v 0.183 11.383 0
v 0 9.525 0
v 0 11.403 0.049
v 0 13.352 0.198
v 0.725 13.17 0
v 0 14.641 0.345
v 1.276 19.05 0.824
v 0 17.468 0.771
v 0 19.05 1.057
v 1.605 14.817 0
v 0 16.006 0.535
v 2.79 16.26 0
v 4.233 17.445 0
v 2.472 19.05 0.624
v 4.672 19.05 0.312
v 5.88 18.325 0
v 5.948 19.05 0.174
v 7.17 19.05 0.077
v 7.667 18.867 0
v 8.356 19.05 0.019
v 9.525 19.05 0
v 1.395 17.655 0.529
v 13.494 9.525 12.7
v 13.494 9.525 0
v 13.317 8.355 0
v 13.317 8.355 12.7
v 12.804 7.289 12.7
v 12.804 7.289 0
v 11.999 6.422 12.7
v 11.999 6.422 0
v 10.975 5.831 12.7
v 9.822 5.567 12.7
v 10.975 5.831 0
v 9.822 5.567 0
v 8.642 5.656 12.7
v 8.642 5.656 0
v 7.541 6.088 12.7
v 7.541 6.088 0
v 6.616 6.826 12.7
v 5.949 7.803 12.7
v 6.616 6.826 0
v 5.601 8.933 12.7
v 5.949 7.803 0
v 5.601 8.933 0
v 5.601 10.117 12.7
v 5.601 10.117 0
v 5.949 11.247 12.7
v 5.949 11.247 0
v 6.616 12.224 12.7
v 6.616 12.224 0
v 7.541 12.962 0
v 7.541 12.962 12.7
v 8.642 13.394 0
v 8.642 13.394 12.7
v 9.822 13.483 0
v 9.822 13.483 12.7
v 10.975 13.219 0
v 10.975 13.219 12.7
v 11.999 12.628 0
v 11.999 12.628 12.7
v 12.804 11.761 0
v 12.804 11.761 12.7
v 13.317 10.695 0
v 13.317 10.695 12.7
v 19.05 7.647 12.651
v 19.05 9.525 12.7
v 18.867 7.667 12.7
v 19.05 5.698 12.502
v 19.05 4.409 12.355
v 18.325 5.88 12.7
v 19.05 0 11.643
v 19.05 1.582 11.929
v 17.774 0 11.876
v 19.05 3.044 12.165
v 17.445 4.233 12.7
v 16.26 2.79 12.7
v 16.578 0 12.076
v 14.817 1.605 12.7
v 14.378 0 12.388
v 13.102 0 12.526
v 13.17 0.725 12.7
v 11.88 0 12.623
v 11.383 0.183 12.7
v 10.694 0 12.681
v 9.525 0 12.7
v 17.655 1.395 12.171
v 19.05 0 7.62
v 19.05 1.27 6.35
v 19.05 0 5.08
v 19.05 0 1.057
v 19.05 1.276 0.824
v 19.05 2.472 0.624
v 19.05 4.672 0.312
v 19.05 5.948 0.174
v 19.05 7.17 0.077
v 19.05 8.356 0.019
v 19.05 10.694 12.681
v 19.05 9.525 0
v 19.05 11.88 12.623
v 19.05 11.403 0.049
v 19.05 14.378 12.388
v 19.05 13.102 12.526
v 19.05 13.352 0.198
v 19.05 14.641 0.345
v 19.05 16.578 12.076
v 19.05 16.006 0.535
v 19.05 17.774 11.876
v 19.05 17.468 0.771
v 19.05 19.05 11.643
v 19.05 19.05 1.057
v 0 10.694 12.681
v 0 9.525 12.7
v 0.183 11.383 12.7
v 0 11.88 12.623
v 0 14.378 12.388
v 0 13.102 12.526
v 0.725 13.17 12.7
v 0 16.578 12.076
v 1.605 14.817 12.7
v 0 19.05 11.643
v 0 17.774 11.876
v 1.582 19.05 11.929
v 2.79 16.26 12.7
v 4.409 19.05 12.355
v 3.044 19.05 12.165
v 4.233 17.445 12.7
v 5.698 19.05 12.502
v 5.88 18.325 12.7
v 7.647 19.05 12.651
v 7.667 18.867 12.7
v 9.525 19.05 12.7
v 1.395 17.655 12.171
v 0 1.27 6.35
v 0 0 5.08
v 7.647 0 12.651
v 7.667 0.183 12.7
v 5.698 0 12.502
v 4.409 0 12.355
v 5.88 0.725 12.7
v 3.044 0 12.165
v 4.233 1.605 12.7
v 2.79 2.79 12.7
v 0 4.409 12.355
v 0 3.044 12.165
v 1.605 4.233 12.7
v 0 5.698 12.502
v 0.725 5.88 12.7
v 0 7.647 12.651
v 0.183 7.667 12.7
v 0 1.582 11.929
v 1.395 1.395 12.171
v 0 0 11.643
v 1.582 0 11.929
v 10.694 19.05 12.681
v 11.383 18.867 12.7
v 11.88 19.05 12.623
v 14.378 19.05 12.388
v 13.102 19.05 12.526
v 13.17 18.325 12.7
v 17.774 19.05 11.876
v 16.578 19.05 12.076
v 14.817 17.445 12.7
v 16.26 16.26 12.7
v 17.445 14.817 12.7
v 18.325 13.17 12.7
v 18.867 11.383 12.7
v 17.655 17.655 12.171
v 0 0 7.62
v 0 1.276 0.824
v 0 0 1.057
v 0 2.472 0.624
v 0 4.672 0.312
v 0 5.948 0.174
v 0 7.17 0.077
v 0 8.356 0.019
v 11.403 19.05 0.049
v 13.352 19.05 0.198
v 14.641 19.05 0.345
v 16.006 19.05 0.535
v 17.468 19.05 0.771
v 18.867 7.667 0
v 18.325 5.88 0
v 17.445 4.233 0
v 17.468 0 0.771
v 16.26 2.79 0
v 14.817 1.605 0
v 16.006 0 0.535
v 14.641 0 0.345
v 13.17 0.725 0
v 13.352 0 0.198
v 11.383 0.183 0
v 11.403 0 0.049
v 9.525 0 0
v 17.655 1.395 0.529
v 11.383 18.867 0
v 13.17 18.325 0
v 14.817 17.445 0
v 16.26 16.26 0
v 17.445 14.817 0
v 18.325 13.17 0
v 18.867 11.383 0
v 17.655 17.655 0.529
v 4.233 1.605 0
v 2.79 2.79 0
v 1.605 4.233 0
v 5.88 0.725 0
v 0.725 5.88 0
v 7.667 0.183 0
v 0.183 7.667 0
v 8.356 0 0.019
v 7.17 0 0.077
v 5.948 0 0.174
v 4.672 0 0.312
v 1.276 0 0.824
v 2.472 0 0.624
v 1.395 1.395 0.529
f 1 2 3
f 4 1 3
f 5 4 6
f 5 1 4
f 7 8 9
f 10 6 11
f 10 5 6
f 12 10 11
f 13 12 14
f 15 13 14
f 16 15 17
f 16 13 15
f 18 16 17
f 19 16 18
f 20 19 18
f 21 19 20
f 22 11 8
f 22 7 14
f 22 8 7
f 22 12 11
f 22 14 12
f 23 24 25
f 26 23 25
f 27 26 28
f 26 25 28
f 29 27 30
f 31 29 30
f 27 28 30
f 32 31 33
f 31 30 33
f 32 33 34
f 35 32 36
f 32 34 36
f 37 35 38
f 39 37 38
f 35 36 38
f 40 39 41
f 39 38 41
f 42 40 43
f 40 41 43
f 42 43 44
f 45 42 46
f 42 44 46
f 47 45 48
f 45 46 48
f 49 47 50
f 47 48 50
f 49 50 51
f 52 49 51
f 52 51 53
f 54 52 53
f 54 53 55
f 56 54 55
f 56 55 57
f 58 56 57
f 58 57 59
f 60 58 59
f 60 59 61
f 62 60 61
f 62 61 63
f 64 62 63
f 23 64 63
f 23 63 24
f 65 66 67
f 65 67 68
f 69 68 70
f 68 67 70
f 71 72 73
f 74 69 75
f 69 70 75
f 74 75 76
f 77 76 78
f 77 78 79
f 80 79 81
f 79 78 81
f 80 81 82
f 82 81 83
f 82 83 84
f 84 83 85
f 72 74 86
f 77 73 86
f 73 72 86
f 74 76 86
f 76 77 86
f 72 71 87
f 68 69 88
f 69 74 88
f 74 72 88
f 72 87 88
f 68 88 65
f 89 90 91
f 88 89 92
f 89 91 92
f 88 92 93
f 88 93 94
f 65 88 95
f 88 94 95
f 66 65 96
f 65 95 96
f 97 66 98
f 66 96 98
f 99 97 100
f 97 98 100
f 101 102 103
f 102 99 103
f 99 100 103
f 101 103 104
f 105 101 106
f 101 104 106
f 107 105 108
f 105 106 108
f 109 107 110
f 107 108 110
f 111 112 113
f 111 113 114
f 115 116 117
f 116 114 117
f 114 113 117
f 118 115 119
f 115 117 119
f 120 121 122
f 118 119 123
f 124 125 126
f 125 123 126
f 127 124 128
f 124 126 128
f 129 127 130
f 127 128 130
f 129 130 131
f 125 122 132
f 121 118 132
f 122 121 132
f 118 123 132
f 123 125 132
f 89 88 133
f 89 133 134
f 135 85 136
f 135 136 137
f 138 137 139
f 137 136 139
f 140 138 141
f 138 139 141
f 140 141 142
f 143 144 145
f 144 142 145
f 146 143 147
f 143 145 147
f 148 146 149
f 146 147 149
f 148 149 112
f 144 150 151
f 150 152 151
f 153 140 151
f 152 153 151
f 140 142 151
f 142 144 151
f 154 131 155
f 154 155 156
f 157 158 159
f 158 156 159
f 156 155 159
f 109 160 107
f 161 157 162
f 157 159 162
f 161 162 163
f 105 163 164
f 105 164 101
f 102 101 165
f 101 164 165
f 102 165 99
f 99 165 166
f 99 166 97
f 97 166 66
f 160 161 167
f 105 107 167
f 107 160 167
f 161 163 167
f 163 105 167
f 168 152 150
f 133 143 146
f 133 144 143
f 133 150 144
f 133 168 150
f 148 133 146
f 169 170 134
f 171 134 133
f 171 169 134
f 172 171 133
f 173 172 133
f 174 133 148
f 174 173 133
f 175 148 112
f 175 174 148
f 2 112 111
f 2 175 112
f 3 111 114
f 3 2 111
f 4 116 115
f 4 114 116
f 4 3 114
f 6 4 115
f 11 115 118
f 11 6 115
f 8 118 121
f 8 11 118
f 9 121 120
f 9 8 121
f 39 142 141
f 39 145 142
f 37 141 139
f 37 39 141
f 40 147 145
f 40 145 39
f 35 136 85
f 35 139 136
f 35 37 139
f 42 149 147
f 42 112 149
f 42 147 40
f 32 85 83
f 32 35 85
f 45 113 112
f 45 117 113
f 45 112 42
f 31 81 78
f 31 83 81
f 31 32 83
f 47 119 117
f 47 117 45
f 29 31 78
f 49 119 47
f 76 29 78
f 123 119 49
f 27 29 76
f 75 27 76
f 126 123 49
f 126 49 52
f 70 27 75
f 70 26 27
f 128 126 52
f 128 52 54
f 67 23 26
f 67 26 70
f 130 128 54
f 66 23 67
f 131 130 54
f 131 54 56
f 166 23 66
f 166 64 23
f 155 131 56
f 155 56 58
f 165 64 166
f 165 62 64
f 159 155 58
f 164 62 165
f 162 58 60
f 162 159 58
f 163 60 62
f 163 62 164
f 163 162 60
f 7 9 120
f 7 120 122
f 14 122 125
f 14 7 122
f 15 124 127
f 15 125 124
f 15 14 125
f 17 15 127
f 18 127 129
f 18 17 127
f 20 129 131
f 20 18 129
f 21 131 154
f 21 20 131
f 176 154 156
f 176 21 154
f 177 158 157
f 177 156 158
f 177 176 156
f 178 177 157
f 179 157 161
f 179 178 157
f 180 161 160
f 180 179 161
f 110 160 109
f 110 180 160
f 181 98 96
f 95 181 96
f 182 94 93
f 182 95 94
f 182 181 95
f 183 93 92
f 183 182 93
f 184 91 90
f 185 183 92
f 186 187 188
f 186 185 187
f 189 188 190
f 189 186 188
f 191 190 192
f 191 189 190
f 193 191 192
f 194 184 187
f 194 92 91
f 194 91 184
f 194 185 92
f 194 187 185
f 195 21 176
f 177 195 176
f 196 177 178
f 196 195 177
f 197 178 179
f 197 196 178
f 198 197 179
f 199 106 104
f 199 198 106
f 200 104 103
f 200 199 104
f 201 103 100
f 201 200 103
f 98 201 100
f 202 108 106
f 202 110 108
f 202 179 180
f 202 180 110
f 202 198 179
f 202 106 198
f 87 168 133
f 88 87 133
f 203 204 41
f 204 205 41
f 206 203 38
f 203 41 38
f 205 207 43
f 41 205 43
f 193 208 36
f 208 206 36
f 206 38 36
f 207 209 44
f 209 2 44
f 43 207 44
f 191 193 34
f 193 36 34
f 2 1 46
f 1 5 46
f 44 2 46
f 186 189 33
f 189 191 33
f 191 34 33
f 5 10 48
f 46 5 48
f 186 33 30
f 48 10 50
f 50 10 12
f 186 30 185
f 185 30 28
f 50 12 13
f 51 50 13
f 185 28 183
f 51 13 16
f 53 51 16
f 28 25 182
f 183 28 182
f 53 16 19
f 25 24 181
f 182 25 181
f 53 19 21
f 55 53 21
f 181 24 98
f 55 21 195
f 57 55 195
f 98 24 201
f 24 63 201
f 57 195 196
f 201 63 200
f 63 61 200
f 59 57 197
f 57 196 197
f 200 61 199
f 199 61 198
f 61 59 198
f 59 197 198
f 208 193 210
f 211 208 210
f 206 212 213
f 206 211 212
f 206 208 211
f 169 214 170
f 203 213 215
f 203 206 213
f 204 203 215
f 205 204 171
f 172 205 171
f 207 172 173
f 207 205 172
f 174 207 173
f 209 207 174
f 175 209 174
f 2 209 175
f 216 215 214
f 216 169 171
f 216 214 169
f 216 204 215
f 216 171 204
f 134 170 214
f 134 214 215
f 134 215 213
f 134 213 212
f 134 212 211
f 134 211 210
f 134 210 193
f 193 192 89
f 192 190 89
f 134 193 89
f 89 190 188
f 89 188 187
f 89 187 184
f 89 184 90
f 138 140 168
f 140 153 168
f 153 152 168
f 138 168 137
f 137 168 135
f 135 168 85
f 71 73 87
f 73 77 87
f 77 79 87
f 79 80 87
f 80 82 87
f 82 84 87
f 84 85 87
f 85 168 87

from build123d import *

# Parameters (mm, degrees)
F0_W     = 19.05
F0_H     = 19.05
F1_DEPTH = 12.7
F3_DEPTH = 19.05
F6_R     = 3.96875
F7_DEPTH = 19.05


with BuildPart() as f1:
    # F0 (on Top) → F1 (new body)
    with BuildSketch(Plane.XY):
        with Locations((9.525, 9.525)):
            Rectangle(F0_W, F0_H)
    extrude(amount=F1_DEPTH)

    # F2 (on face) → F3 (cut)
    with BuildSketch(Plane(origin=(0, 0, 0), x_dir=(0, -1, 0), z_dir=(-1, 0, 0))):
        Polygon((0, 7.62), (-1.27, 6.35), (0, 5.08), align=None)
    extrude(amount=-F3_DEPTH, mode=Mode.SUBTRACT)

    # F6 (on face) → F7 (cut)
    with BuildSketch(Plane(origin=(0, 0, 0), x_dir=(1, 0, 0), z_dir=(0, 0, -1))):
        with Locations((9.525, -9.525)):
            Circle(F6_R)
    extrude(amount=-F7_DEPTH, mode=Mode.SUBTRACT)

    # F8 (on mid) + F5 (on mid) → F9 (revolve, cut)
    with BuildSketch(Plane(origin=(9.525, 0, 0), x_dir=(0, -1, 0), z_dir=(-1, 0, 0))):
        Polygon((-32.2430354842, 9.1649367963), (-19.05, 12.7), (-32.2430354842, 16.2350632037), align=None)
    with BuildSketch(Plane(origin=(9.525, 0, 0), x_dir=(0, -1, 0), z_dir=(-1, 0, 0))):
        Polygon((8.4822997993, 2.2728253812), (0, 0), (8.4822997993, 0), align=None)
    revolve(axis=Axis((9.525, 9.525, 12.7), (0, 0, -1)), mode=Mode.SUBTRACT)


solid = f1.part
